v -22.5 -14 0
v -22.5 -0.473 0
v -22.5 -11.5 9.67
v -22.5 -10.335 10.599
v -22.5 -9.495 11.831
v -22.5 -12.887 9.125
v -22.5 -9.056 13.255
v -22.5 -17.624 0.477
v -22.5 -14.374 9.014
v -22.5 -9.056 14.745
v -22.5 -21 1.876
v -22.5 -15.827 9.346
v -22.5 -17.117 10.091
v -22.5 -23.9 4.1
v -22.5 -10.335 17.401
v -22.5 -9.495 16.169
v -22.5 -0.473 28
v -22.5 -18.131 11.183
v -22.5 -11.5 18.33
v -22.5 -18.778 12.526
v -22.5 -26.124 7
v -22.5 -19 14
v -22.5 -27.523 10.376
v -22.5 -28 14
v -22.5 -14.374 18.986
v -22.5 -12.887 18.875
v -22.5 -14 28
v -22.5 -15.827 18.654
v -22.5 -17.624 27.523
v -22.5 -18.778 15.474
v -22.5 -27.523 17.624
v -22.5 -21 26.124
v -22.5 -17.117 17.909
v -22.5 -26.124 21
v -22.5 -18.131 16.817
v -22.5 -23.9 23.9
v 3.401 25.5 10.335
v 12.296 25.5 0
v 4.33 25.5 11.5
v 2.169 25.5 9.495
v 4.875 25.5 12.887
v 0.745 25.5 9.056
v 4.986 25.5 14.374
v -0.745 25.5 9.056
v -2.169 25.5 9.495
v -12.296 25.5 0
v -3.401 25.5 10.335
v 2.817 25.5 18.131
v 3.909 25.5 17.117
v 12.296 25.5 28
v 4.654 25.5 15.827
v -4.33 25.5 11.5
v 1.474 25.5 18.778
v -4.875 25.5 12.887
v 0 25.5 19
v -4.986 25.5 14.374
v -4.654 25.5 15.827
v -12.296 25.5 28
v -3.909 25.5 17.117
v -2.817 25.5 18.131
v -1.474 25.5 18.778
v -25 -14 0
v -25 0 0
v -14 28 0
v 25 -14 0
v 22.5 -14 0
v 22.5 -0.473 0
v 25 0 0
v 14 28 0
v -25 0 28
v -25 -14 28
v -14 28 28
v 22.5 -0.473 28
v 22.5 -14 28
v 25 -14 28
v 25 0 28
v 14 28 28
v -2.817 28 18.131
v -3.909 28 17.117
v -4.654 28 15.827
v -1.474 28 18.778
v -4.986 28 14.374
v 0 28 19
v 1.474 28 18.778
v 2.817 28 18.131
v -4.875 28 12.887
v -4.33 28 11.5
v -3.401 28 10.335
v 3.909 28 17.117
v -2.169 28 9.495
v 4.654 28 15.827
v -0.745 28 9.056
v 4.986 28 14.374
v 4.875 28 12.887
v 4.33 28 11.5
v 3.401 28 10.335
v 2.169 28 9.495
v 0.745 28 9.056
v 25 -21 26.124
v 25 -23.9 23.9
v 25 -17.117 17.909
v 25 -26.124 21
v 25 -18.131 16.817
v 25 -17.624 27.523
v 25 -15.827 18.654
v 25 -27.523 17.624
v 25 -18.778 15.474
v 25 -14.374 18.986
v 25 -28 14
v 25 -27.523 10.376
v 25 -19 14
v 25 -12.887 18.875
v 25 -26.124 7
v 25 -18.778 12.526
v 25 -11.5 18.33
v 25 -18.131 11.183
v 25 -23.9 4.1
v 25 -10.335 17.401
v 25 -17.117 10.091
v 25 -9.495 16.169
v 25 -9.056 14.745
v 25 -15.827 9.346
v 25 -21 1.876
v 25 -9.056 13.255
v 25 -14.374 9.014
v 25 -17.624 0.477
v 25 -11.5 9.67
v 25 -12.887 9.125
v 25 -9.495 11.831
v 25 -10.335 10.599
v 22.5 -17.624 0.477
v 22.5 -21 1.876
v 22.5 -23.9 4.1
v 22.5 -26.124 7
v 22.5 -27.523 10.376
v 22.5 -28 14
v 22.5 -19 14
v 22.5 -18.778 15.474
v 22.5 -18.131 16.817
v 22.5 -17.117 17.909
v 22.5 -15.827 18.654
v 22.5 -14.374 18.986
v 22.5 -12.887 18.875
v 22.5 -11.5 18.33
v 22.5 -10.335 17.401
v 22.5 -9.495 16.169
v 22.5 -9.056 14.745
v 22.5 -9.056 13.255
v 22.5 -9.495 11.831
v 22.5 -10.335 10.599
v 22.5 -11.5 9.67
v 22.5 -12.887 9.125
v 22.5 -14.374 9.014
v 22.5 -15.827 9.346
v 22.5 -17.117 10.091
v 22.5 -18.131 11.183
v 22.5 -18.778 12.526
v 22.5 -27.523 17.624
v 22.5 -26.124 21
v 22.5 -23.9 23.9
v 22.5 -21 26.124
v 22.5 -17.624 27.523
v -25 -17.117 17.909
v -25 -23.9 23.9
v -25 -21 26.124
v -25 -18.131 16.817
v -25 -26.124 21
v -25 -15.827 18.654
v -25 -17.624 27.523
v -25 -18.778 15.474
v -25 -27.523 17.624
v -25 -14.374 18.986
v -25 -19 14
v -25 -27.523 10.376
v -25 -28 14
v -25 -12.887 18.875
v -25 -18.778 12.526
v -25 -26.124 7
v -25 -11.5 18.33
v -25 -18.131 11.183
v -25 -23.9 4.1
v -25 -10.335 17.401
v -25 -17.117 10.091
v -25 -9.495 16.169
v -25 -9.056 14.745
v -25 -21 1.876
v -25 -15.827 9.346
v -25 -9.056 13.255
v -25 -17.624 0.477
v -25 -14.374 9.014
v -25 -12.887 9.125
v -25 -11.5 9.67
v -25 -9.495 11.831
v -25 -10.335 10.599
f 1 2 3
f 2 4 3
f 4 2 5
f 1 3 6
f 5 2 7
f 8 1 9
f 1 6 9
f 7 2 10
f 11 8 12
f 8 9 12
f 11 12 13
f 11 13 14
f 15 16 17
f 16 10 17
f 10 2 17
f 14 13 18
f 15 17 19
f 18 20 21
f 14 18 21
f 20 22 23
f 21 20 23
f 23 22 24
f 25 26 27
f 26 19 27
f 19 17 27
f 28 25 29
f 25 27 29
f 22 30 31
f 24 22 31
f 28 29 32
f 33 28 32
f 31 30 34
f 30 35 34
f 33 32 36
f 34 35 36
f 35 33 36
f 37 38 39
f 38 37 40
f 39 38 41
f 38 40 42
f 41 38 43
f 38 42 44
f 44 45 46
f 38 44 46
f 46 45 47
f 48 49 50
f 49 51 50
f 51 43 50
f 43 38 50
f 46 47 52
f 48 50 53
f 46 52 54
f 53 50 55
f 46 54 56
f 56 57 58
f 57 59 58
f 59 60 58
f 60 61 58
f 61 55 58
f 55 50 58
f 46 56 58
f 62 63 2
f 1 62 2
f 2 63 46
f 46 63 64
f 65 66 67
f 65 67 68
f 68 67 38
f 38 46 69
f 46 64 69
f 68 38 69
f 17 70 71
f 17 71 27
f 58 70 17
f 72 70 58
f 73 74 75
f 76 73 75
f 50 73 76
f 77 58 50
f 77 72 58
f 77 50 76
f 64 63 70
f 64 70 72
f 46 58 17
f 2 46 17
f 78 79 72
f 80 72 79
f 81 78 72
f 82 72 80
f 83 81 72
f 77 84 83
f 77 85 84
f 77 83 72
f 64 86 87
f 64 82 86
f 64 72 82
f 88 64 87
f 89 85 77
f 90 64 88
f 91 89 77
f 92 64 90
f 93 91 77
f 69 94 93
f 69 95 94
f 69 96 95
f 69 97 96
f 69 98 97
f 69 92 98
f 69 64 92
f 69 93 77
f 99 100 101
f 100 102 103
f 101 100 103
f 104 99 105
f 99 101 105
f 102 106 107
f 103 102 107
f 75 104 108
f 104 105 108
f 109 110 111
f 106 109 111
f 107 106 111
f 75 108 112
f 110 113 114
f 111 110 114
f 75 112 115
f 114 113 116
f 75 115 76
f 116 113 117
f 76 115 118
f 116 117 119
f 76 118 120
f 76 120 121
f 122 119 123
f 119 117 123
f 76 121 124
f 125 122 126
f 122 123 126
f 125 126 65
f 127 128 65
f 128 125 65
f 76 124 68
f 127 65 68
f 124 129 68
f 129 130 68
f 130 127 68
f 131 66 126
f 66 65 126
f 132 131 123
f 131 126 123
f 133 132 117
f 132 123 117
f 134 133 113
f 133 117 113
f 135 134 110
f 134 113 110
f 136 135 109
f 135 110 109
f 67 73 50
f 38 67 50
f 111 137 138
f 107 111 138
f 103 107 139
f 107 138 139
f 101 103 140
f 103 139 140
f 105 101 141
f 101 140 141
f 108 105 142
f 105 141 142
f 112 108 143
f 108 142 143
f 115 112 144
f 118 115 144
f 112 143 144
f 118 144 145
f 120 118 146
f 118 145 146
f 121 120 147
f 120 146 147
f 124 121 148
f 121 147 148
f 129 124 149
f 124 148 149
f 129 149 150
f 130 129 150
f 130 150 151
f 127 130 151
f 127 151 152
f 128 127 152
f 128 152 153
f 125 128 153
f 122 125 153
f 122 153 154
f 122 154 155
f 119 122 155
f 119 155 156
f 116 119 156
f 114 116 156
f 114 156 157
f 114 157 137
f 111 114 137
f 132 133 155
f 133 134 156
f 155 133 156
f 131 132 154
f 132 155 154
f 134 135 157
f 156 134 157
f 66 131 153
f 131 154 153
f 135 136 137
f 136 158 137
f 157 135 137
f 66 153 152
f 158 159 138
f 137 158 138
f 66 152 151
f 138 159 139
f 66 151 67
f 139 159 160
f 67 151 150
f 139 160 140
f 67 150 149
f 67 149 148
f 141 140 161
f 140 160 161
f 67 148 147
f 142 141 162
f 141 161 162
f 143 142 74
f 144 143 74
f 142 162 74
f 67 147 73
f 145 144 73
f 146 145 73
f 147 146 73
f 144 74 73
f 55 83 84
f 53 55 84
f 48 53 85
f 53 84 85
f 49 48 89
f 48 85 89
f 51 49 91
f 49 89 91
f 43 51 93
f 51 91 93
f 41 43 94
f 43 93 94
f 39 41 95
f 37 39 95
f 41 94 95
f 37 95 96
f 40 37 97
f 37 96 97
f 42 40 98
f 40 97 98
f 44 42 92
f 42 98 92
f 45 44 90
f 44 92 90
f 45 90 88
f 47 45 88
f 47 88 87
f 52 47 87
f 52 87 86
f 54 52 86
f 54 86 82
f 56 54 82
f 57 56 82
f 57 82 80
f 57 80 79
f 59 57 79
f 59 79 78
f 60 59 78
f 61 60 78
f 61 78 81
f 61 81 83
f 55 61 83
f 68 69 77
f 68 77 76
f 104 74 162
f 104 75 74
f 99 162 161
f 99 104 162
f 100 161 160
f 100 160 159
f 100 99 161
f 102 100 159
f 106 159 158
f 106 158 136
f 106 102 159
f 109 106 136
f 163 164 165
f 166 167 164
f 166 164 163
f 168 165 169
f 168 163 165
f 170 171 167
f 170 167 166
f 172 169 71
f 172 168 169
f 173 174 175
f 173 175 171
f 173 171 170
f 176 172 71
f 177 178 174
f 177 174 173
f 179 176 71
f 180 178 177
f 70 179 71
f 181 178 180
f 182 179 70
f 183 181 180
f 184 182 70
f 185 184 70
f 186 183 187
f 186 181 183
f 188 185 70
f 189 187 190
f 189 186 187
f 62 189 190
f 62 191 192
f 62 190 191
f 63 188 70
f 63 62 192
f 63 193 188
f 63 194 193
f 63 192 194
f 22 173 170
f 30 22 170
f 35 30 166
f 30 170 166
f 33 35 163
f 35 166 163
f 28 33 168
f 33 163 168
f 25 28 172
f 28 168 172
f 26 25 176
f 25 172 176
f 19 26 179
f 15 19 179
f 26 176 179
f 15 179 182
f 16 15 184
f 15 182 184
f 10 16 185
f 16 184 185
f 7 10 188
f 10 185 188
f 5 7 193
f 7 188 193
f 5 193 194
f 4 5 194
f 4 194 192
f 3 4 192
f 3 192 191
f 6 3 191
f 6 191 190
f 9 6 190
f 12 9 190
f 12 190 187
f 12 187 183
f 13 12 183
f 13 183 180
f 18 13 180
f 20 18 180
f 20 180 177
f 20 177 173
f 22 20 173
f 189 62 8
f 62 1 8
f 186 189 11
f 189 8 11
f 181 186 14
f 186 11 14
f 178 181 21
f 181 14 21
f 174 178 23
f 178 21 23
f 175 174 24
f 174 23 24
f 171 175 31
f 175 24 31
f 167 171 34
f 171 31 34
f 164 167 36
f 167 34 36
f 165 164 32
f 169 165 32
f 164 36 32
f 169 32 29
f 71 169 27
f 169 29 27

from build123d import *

# Parameters (mm, degrees)
ESBO_O1_W                  = 50
ESBO_O1_H                  = 56
RESSALTO_EXTRUS_O1_DEPTH   = 28
CORTE_EXTRUS_O1_DEPTH      = 28
CORTE_EXTRUS_O7_DEPTH      = 28
CORTE_EXTRUS_O7_DEPTH_BACK = 28
ESBO_O7_R                  = 5
CORTE_EXTRUS_O8_DEPTH      = 64.780874876
ESBO_O8_R                  = 5
CORTE_EXTRUS_O9_DEPTH      = 68.416615163
FILETE7_R                  = 14
FILETE8_R                  = 14


with BuildPart() as part:
    # Esboço1 → Ressalto-extrusão1 (new body)
    with BuildSketch(Plane.XY):
        Rectangle(ESBO_O1_W, ESBO_O1_H)
    extrude(amount=RESSALTO_EXTRUS_O1_DEPTH)

    # Esboço5 → Corte-extrusão1 (cut)
    with BuildSketch(Plane.XY.offset(28)):
        Polygon((-22.5, -0.473458617), (-22.5, -28), (22.5, -28), (22.5, -0.473458617), (12.296141258, 25.5), (0, 25.5), (-12.296141258, 25.5), align=None)
    extrude(amount=-CORTE_EXTRUS_O1_DEPTH, mode=Mode.SUBTRACT)

    # Esboço2 → Corte-extrusão7 (cut, two sides: drawn at the far end of the back side and taken through both)
    with BuildSketch(Plane.XY.offset(-CORTE_EXTRUS_O7_DEPTH_BACK)):
        Polygon((-14, 28), (-25, 28), (-25, 0), align=None)
        Polygon((25, 0), (25, 28), (14, 28), align=None)
    extrude(amount=CORTE_EXTRUS_O7_DEPTH + CORTE_EXTRUS_O7_DEPTH_BACK, mode=Mode.SUBTRACT)

    # Esboço7 → Corte-extrusão8 (cut, through all)
    with BuildSketch(Plane.ZY.offset(25)):
        with Locations(Location((14, -14, 0), (0, 0, 270))):
            Circle(ESBO_O7_R)
    extrude(amount=-CORTE_EXTRUS_O8_DEPTH, mode=Mode.SUBTRACT)

    # Esboço8 → Corte-extrusão9 (cut, through all)
    with BuildSketch(Plane(origin=(0, 28, 0), x_dir=(1, 0, 0), z_dir=(0, 1, 0))):
        with Locations(Location((0, -14, 0), (0, 0, 270))):
            Circle(ESBO_O8_R)
    extrude(amount=-CORTE_EXTRUS_O9_DEPTH, mode=Mode.SUBTRACT)

    # Filete7
    filete7_edges = [part.edges().sort_by_distance(p)[0] for p in [
        (-23.75, -28, 0),
        (-23.75, -28, 28),
    ]]
    fillet(filete7_edges, radius=FILETE7_R - 0.0001)  # a hair under: the kernel refuses the full size

    # Filete8
    filete8_edges = [part.edges().sort_by_distance(p)[0] for p in [
        (23.75, -28, 28),
        (23.75, -28, 0),
    ]]
    fillet(filete8_edges, radius=FILETE8_R - 0.0001)  # a hair under: the kernel refuses the full size


solid = part.part
